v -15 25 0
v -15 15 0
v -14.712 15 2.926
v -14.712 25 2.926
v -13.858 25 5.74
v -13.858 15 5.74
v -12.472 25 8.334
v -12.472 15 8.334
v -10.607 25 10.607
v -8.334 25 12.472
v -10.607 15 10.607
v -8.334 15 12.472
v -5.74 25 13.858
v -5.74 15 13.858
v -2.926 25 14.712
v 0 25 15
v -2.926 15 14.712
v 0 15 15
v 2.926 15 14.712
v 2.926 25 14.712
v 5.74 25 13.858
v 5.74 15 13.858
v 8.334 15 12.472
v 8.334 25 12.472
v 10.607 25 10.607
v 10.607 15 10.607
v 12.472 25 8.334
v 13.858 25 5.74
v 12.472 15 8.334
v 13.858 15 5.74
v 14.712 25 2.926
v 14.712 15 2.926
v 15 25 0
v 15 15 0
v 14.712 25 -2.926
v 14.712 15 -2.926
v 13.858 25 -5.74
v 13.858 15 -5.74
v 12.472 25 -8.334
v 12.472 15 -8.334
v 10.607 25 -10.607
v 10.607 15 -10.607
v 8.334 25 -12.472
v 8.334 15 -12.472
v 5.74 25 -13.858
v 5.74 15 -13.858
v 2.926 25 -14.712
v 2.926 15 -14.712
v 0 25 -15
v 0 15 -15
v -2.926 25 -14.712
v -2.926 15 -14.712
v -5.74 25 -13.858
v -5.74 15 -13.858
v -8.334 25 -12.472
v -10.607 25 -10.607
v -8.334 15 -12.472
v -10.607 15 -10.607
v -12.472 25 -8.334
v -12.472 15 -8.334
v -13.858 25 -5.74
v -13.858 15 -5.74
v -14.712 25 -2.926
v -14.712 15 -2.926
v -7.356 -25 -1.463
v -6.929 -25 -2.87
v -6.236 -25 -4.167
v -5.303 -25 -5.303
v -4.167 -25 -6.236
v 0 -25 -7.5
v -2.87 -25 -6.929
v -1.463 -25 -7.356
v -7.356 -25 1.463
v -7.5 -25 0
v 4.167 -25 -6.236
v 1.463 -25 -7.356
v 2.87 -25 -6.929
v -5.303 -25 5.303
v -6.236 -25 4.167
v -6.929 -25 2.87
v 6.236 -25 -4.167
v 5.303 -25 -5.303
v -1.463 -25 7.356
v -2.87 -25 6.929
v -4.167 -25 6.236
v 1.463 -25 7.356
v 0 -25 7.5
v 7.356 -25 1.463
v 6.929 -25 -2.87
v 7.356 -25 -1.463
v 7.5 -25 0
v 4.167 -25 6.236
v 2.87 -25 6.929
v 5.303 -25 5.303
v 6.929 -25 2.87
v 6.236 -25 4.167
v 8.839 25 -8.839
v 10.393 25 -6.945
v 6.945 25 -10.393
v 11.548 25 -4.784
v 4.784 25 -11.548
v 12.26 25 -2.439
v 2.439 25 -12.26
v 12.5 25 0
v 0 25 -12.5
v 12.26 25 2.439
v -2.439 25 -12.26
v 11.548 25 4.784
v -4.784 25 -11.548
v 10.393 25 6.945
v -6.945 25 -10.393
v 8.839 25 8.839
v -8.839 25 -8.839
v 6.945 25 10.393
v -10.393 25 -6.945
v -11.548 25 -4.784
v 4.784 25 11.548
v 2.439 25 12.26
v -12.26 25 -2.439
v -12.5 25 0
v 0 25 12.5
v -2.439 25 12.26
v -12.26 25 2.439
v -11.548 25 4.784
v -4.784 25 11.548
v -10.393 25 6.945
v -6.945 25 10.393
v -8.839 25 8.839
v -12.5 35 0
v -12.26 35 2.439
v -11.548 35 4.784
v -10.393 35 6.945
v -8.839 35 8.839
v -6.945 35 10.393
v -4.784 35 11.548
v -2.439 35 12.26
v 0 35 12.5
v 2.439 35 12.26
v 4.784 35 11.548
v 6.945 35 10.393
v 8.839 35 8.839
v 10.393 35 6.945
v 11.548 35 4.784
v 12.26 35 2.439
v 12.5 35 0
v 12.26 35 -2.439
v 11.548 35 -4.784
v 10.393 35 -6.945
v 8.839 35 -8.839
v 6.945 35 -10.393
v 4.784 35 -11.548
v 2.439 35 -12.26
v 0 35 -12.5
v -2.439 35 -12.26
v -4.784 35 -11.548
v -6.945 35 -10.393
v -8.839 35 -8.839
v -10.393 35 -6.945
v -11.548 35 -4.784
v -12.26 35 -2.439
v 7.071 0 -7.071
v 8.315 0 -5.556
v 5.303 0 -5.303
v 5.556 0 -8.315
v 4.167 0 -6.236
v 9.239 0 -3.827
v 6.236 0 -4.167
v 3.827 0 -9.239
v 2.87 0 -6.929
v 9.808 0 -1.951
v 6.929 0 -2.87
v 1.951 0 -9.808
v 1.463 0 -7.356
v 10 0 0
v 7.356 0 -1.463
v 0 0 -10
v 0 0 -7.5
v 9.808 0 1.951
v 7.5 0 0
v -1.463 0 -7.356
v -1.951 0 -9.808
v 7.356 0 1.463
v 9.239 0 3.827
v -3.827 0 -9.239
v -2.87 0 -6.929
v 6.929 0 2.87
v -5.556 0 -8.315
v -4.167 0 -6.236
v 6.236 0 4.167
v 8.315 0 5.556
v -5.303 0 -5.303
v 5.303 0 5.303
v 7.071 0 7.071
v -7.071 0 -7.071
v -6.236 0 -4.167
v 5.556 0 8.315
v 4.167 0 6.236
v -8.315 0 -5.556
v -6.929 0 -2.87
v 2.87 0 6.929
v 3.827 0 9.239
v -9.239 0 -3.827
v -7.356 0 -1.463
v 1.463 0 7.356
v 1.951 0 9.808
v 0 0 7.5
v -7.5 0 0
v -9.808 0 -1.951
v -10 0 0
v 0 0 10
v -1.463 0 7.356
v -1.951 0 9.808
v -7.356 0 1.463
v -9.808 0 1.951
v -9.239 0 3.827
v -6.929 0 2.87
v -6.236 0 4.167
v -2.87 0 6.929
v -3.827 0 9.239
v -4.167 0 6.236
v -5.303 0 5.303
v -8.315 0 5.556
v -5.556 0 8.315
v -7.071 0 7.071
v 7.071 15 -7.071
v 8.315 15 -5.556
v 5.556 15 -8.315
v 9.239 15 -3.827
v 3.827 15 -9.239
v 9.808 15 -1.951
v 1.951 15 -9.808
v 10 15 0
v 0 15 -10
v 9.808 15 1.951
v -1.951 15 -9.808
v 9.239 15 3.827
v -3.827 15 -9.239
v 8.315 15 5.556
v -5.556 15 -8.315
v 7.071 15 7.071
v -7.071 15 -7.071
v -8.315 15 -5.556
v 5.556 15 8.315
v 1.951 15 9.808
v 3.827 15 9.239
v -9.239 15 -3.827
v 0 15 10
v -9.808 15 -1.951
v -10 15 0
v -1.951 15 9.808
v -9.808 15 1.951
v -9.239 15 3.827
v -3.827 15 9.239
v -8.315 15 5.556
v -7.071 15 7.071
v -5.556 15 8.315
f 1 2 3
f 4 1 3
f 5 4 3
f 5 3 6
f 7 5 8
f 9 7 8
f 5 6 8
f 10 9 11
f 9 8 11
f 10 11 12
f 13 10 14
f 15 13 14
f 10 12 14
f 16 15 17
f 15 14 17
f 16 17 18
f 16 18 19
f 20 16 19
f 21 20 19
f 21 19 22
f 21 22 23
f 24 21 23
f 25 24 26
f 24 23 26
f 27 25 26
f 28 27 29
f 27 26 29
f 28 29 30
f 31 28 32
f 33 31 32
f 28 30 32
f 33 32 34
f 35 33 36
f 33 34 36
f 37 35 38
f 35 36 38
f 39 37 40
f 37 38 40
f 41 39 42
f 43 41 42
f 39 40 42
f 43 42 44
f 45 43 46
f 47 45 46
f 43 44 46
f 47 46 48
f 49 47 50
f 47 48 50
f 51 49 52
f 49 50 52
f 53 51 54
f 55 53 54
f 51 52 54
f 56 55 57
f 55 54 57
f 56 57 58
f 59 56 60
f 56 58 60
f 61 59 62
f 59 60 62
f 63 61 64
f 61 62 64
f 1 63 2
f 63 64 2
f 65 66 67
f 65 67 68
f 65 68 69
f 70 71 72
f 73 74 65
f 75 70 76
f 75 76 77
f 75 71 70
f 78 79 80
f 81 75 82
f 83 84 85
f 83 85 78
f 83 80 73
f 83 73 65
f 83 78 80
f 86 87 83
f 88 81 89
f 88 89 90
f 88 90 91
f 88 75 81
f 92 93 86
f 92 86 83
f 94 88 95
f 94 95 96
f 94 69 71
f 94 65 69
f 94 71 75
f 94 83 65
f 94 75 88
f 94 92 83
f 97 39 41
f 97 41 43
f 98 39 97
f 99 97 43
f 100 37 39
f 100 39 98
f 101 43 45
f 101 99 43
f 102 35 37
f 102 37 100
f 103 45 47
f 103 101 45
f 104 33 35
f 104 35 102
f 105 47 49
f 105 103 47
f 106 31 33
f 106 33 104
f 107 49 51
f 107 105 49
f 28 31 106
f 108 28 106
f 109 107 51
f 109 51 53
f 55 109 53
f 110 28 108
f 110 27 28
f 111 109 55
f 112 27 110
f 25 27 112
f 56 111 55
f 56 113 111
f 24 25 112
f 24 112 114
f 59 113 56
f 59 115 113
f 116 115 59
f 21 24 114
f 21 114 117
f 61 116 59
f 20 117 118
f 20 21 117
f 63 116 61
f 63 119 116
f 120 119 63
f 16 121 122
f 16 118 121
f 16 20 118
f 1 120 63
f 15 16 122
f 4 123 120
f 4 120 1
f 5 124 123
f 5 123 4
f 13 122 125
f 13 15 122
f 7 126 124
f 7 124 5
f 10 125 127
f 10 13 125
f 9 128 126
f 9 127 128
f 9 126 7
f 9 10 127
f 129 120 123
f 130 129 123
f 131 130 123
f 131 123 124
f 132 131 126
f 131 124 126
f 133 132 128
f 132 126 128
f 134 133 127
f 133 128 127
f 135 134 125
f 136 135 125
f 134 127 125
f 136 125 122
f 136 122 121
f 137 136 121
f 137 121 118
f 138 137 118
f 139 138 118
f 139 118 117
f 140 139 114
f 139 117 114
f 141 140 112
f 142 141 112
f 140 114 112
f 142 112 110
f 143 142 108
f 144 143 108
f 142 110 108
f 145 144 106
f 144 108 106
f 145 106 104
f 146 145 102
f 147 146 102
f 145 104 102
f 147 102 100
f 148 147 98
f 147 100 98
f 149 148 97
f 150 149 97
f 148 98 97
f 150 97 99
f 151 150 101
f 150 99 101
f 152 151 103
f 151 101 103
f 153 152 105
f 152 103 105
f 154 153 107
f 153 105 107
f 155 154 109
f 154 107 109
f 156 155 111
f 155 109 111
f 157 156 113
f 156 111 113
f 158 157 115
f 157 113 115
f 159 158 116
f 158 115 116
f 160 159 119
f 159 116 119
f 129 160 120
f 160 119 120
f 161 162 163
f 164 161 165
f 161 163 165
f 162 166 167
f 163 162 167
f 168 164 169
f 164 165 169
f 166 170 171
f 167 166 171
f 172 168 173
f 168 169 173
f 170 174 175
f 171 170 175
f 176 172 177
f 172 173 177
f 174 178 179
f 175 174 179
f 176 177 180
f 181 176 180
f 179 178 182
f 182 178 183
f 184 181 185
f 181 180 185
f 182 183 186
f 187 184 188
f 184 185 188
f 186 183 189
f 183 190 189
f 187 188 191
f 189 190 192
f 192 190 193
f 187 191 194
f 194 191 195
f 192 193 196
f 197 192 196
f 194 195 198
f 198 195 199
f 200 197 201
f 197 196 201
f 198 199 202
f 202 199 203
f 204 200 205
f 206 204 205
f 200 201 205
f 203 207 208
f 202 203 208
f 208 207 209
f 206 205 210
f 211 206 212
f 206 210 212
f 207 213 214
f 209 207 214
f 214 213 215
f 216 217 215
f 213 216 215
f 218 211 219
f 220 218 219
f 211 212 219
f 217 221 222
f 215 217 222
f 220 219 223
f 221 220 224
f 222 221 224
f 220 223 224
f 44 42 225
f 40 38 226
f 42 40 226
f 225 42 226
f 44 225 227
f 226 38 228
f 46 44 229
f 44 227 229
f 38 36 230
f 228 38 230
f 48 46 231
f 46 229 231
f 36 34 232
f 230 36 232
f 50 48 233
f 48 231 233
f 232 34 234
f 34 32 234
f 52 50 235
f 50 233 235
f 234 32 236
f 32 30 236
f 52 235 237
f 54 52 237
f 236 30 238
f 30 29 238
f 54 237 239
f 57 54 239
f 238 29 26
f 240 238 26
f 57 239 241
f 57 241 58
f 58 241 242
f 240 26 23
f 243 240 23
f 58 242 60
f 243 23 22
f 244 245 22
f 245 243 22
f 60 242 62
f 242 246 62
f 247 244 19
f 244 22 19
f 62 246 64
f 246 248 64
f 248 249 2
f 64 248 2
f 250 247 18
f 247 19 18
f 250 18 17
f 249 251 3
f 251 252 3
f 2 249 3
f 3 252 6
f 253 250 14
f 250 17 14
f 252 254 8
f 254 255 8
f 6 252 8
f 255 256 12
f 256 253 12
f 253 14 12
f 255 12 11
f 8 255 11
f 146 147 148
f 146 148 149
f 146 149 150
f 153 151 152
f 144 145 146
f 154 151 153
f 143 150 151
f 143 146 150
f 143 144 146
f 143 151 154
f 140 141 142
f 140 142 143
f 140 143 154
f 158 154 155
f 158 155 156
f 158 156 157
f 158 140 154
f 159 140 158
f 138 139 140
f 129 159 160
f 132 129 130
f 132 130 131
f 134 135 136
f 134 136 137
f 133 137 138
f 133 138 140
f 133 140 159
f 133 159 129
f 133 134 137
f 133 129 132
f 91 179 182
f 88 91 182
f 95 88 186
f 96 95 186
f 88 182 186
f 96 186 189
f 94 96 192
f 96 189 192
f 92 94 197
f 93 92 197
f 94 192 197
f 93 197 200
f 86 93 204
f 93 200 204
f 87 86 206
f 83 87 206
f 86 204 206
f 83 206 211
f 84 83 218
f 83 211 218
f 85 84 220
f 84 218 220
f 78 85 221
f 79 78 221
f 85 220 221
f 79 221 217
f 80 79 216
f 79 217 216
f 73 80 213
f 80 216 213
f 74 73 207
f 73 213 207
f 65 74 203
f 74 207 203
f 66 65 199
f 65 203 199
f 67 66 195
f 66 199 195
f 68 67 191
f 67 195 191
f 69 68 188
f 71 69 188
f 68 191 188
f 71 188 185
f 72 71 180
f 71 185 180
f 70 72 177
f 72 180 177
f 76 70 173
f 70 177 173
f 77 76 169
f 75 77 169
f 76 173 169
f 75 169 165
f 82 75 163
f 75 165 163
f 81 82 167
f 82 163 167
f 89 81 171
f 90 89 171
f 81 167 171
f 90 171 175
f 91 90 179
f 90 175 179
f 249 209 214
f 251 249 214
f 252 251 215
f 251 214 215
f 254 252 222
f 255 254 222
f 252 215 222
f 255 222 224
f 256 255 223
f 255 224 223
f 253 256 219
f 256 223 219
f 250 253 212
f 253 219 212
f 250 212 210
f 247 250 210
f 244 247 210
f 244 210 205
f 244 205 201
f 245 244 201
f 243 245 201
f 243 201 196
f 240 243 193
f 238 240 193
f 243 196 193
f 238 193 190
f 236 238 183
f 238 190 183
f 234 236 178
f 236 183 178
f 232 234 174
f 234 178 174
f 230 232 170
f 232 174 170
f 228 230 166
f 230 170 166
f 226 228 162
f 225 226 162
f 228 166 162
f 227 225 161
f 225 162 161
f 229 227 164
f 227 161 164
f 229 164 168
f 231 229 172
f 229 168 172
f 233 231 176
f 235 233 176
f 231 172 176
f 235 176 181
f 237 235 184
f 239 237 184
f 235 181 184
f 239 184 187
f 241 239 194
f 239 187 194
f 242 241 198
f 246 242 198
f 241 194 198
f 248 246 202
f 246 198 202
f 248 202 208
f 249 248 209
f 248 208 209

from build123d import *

# Parameters (mm, degrees)
F0_R     = 7.5
F1_DEPTH = 25
F2_R     = 10
F3_DEPTH = 15
F4_R     = 15
F5_DEPTH = 10
F6_R     = 12.5
F7_DEPTH = 10


with BuildPart() as f1:
    # F0 (on Front) → F1 (new body)
    with BuildSketch(Plane.XZ):
        Circle(F0_R)
    extrude(amount=F1_DEPTH)

    # F2 (on face) → F3 (join)
    with BuildSketch(Plane(origin=(0, 0, 0), x_dir=(-1, 0, 0), z_dir=(0, 1, 0))):
        Circle(F2_R)
    extrude(amount=F3_DEPTH)

    # F4 (on face) → F5 (join)
    with BuildSketch(Plane(origin=(0, 15, 0), x_dir=(-1, 0, 0), z_dir=(0, 1, 0))):
        Circle(F4_R)
    extrude(amount=F5_DEPTH)

    # F6 (on face) → F7 (join)
    with BuildSketch(Plane(origin=(0, 25, 0), x_dir=(-1, 0, 0), z_dir=(0, 1, 0))):
        Circle(F6_R)
    extrude(amount=F7_DEPTH)


solid = f1.part
